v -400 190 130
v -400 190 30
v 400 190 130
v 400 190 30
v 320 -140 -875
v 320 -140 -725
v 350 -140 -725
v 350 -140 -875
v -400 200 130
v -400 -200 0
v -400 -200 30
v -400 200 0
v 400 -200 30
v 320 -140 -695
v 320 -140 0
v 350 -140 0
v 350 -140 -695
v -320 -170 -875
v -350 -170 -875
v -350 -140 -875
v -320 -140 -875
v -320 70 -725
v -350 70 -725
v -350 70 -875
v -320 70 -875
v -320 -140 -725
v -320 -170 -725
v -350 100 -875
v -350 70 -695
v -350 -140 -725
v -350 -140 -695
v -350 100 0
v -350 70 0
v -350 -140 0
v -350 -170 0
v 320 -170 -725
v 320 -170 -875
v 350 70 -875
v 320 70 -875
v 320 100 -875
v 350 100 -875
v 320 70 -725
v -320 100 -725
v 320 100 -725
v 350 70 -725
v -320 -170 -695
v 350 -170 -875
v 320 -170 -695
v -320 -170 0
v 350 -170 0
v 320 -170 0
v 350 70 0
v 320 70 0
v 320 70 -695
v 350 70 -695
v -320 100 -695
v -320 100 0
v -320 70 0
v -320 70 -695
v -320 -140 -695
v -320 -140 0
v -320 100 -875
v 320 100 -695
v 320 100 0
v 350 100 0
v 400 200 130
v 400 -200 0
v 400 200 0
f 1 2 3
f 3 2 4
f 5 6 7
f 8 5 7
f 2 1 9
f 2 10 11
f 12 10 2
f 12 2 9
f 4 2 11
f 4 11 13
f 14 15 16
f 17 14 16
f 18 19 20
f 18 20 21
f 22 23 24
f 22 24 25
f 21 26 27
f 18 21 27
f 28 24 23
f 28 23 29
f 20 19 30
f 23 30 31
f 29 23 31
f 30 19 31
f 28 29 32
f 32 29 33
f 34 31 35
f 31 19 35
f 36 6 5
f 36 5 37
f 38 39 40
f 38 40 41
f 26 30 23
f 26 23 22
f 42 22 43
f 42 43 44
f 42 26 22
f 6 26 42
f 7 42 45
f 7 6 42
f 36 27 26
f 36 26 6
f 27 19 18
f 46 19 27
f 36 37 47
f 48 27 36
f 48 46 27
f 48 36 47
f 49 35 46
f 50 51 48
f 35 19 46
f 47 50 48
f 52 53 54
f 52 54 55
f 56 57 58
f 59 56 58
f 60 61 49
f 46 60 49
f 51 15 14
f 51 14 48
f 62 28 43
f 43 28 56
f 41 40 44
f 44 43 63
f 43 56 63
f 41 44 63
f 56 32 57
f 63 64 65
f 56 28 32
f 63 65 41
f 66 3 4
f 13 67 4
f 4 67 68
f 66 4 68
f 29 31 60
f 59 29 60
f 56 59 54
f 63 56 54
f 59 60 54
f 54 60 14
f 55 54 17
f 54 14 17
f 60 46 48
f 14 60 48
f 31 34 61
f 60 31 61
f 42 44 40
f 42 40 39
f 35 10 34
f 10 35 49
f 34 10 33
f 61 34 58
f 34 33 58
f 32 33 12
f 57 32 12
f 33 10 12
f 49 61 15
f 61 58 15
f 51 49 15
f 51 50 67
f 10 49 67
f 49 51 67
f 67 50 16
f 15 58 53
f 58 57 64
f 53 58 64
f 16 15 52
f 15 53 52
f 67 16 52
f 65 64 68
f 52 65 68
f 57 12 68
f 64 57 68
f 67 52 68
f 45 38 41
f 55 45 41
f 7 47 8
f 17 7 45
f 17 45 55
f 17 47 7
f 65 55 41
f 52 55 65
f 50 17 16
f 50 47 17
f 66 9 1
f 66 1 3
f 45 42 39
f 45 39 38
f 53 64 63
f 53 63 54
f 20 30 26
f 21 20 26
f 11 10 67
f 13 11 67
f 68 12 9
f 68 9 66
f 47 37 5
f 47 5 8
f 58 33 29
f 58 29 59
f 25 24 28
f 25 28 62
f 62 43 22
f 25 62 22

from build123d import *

# Parameters (mm, degrees)
F0_W          = 800
F0_H          = 400
F1_DEPTH      = 30
F2_W          = 800
F2_H          = 10
F3_DEPTH      = 100
F4_W          = 30
F4_H          = 30
F5_DEPTH      = 875
F6_W          = 700
F6_H          = 30
F7_DEPTH      = 170
F7_DEPTH_BACK = 100


with BuildPart() as f1:
    # F0 (on Top) → F1 (new body)
    with BuildSketch(Plane.XY):
        Rectangle(F0_W, F0_H)
    extrude(amount=F1_DEPTH)

    # F2 (on face) → F3 (join)
    with BuildSketch(Plane.XY.offset(30)):
        with Locations((0, 195)):
            Rectangle(F2_W, F2_H)
    extrude(amount=F3_DEPTH)

    # F4 (on face) → F5 (join)
    with BuildSketch(Plane(origin=(0, 0, 0), x_dir=(1, 0, 0), z_dir=(0, 0, -1))):
        with Locations((335, 155)):
            Rectangle(F4_W, F4_H)
        with Locations((335, -85)):
            Rectangle(F4_W, F4_H)
        with Locations((-335, 155)):
            Rectangle(F4_W, F4_H)
        with Locations((-335, -85)):
            Rectangle(F4_W, F4_H)
    extrude(amount=F5_DEPTH)

    # F6 (on Front) → F7 (join, two sides)
    with BuildSketch(Plane.XZ) as f7_sk:
        with Locations((0, -710)):
            Rectangle(F6_W, F6_H)
    extrude(amount=F7_DEPTH)
    extrude(f7_sk.sketch, amount=-F7_DEPTH_BACK)


solid = f1.part
